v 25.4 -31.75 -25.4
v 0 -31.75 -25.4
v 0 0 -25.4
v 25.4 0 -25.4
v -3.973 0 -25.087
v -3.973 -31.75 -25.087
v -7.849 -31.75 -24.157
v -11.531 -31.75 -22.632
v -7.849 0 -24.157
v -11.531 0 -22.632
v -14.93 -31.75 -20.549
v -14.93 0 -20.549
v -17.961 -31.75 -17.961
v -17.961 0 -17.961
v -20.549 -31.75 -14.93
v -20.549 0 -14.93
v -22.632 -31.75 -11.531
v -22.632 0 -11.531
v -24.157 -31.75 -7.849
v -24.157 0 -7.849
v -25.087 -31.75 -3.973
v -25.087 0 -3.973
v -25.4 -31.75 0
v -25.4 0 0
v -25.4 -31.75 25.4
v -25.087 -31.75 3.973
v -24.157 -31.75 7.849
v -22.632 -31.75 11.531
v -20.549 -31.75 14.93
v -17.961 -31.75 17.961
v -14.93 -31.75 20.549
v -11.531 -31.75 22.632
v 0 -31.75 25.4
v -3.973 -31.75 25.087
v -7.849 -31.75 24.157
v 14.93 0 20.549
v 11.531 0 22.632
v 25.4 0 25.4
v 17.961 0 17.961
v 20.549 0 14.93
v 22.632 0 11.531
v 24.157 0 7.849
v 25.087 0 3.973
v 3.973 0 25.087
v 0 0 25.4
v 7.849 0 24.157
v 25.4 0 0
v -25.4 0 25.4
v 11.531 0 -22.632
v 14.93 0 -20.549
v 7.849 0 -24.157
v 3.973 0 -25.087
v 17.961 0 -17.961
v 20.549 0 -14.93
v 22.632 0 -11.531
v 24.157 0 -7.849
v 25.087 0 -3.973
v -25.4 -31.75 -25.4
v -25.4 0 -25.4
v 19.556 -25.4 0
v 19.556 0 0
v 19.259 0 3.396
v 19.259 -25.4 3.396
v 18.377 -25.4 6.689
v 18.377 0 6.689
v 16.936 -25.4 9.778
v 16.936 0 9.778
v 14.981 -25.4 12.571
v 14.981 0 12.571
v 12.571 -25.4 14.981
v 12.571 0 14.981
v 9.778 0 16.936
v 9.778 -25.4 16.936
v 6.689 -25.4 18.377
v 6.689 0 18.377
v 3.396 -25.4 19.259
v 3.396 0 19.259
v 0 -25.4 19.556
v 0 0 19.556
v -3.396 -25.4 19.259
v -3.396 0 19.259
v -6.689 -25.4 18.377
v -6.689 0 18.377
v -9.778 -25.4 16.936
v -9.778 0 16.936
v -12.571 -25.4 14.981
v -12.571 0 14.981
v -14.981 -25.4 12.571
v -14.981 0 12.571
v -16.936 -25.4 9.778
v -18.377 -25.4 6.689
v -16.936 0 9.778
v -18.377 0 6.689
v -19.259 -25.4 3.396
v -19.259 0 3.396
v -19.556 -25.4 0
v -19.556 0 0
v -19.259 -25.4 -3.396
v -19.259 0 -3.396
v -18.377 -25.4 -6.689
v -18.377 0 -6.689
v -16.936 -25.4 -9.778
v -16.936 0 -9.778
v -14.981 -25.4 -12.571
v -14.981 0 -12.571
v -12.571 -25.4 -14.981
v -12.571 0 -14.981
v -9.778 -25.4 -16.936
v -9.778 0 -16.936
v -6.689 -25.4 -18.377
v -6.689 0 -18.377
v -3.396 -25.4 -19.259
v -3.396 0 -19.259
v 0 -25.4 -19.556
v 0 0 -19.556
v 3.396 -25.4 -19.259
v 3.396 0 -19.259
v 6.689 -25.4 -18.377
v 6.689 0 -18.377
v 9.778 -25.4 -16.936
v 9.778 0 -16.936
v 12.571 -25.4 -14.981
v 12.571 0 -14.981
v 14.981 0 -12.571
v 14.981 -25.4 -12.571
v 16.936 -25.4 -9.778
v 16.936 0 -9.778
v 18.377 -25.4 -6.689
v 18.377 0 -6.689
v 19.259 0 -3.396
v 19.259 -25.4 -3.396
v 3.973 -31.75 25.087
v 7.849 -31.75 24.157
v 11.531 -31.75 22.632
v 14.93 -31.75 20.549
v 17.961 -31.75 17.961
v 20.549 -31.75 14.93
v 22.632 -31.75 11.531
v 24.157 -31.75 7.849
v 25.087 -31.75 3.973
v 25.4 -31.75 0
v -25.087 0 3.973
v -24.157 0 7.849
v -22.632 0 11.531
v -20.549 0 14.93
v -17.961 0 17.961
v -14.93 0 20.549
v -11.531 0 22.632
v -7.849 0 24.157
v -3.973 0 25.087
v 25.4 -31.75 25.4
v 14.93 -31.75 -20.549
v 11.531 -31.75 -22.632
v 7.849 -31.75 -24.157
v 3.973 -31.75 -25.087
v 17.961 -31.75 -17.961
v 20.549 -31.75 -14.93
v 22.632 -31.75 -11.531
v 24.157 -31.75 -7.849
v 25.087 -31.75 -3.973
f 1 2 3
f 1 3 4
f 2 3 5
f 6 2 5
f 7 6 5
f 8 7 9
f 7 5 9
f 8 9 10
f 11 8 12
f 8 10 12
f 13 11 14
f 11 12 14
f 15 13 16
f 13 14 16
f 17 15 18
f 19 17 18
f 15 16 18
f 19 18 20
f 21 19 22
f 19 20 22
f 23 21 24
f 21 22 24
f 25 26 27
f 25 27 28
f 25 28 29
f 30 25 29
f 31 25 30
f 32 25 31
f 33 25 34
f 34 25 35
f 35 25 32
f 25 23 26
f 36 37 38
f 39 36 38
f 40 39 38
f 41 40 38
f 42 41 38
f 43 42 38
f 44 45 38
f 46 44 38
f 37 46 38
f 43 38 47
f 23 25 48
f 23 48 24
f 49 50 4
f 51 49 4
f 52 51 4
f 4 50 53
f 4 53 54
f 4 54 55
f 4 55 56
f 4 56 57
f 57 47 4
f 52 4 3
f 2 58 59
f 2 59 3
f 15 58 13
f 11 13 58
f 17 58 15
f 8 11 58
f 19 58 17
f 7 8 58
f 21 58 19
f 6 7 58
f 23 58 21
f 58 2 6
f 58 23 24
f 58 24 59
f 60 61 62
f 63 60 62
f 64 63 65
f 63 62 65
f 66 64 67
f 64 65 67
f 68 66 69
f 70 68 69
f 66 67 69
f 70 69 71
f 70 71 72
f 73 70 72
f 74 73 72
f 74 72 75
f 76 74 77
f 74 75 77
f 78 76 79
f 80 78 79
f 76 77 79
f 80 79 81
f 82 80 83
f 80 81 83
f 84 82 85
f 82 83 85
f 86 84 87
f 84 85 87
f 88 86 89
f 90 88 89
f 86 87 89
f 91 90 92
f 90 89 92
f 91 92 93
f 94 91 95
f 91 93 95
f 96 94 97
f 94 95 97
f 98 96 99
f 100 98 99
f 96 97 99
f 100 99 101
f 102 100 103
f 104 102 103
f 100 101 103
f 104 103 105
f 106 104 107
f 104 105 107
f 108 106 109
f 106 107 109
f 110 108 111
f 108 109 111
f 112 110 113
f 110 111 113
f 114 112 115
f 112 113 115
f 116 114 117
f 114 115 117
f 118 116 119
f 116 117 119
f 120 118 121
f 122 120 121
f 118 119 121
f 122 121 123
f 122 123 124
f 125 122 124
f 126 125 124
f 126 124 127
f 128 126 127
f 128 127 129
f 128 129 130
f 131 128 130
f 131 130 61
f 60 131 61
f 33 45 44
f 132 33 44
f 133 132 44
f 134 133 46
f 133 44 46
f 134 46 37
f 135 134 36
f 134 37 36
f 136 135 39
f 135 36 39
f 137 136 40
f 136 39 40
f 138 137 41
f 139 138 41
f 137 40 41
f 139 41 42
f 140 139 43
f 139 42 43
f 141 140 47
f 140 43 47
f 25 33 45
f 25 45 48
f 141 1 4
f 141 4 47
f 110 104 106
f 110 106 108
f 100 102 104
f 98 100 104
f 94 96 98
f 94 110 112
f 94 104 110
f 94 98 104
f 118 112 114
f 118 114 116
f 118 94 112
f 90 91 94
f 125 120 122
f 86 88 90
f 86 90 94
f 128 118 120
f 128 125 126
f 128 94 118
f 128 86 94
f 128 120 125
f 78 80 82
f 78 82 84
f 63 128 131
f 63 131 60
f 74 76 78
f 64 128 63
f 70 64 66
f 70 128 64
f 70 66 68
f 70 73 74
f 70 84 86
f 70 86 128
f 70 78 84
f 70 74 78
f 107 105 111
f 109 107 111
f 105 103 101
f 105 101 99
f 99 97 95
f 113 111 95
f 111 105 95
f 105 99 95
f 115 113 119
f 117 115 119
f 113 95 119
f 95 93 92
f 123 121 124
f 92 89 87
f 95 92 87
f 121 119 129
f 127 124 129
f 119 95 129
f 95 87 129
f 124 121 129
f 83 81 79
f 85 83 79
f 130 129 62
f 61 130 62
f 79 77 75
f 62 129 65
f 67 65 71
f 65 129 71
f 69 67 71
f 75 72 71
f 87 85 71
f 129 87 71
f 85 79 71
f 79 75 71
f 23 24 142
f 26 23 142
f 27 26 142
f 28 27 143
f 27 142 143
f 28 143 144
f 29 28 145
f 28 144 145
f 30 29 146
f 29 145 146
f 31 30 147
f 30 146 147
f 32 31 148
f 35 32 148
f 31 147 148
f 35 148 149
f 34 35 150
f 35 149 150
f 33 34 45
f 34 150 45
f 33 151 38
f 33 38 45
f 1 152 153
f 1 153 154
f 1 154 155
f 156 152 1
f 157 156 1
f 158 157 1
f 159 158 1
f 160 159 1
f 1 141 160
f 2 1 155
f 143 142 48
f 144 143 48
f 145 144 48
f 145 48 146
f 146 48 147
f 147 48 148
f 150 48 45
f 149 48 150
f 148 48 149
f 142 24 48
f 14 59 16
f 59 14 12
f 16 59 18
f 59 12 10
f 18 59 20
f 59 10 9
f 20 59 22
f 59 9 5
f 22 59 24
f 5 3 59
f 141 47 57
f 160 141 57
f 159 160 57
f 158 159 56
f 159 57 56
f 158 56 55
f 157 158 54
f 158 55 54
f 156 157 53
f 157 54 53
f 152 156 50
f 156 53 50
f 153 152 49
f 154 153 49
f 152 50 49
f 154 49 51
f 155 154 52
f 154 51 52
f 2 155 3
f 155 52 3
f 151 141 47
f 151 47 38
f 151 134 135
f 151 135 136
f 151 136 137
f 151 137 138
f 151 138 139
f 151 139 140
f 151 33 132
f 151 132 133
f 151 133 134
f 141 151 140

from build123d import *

# Parameters (mm, degrees)
F1_DEPTH = 31.75
F2_R     = 12.7
F3_DEPTH = 25.4
F4_R     = 19.556358
F5_DEPTH = 25.4


with BuildPart() as f1:
    # F0 (on Front) → F1 (new body)
    with BuildSketch(Plane.XZ):
        with BuildLine():
            Line((0, 25.4), (-25.4, 25.4))
            Line((-25.4, 25.4), (-25.4, 0))
            ThreePointArc((-25.4, 0), (-17.960512, 17.960512), (0, 25.4))
        make_face()
        with BuildLine():
            Line((25.4, 25.4), (0, 25.4))
            ThreePointArc((0, 25.4), (17.960512, 17.960512), (25.4, 0))
            Line((25.4, 0), (25.4, 25.4))
        make_face()
        with BuildLine():
            Line((25.4, -25.4), (25.4, 0))
            ThreePointArc((25.4, 0), (17.960512, -17.960512), (0, -25.4))
            Line((0, -25.4), (25.4, -25.4))
        make_face()
        with BuildLine():
            ThreePointArc((0, -25.4), (-17.960512, -17.960512), (-25.4, 0))
            Line((-25.4, 0), (-25.4, -25.4))
            Line((-25.4, -25.4), (0, -25.4))
        make_face()
    extrude(amount=F1_DEPTH)


with BuildPart() as f3:
    # F2 (on Front) → F3 (new body)
    with BuildSketch(Plane.XZ):
        Circle(F2_R)
    extrude(amount=F3_DEPTH)

    # F4 (on Front) → F5 (join)
    with BuildSketch(Plane.XZ):
        Circle(F4_R)
    extrude(amount=F5_DEPTH)


solid = Compound([f1.part, f3.part])
